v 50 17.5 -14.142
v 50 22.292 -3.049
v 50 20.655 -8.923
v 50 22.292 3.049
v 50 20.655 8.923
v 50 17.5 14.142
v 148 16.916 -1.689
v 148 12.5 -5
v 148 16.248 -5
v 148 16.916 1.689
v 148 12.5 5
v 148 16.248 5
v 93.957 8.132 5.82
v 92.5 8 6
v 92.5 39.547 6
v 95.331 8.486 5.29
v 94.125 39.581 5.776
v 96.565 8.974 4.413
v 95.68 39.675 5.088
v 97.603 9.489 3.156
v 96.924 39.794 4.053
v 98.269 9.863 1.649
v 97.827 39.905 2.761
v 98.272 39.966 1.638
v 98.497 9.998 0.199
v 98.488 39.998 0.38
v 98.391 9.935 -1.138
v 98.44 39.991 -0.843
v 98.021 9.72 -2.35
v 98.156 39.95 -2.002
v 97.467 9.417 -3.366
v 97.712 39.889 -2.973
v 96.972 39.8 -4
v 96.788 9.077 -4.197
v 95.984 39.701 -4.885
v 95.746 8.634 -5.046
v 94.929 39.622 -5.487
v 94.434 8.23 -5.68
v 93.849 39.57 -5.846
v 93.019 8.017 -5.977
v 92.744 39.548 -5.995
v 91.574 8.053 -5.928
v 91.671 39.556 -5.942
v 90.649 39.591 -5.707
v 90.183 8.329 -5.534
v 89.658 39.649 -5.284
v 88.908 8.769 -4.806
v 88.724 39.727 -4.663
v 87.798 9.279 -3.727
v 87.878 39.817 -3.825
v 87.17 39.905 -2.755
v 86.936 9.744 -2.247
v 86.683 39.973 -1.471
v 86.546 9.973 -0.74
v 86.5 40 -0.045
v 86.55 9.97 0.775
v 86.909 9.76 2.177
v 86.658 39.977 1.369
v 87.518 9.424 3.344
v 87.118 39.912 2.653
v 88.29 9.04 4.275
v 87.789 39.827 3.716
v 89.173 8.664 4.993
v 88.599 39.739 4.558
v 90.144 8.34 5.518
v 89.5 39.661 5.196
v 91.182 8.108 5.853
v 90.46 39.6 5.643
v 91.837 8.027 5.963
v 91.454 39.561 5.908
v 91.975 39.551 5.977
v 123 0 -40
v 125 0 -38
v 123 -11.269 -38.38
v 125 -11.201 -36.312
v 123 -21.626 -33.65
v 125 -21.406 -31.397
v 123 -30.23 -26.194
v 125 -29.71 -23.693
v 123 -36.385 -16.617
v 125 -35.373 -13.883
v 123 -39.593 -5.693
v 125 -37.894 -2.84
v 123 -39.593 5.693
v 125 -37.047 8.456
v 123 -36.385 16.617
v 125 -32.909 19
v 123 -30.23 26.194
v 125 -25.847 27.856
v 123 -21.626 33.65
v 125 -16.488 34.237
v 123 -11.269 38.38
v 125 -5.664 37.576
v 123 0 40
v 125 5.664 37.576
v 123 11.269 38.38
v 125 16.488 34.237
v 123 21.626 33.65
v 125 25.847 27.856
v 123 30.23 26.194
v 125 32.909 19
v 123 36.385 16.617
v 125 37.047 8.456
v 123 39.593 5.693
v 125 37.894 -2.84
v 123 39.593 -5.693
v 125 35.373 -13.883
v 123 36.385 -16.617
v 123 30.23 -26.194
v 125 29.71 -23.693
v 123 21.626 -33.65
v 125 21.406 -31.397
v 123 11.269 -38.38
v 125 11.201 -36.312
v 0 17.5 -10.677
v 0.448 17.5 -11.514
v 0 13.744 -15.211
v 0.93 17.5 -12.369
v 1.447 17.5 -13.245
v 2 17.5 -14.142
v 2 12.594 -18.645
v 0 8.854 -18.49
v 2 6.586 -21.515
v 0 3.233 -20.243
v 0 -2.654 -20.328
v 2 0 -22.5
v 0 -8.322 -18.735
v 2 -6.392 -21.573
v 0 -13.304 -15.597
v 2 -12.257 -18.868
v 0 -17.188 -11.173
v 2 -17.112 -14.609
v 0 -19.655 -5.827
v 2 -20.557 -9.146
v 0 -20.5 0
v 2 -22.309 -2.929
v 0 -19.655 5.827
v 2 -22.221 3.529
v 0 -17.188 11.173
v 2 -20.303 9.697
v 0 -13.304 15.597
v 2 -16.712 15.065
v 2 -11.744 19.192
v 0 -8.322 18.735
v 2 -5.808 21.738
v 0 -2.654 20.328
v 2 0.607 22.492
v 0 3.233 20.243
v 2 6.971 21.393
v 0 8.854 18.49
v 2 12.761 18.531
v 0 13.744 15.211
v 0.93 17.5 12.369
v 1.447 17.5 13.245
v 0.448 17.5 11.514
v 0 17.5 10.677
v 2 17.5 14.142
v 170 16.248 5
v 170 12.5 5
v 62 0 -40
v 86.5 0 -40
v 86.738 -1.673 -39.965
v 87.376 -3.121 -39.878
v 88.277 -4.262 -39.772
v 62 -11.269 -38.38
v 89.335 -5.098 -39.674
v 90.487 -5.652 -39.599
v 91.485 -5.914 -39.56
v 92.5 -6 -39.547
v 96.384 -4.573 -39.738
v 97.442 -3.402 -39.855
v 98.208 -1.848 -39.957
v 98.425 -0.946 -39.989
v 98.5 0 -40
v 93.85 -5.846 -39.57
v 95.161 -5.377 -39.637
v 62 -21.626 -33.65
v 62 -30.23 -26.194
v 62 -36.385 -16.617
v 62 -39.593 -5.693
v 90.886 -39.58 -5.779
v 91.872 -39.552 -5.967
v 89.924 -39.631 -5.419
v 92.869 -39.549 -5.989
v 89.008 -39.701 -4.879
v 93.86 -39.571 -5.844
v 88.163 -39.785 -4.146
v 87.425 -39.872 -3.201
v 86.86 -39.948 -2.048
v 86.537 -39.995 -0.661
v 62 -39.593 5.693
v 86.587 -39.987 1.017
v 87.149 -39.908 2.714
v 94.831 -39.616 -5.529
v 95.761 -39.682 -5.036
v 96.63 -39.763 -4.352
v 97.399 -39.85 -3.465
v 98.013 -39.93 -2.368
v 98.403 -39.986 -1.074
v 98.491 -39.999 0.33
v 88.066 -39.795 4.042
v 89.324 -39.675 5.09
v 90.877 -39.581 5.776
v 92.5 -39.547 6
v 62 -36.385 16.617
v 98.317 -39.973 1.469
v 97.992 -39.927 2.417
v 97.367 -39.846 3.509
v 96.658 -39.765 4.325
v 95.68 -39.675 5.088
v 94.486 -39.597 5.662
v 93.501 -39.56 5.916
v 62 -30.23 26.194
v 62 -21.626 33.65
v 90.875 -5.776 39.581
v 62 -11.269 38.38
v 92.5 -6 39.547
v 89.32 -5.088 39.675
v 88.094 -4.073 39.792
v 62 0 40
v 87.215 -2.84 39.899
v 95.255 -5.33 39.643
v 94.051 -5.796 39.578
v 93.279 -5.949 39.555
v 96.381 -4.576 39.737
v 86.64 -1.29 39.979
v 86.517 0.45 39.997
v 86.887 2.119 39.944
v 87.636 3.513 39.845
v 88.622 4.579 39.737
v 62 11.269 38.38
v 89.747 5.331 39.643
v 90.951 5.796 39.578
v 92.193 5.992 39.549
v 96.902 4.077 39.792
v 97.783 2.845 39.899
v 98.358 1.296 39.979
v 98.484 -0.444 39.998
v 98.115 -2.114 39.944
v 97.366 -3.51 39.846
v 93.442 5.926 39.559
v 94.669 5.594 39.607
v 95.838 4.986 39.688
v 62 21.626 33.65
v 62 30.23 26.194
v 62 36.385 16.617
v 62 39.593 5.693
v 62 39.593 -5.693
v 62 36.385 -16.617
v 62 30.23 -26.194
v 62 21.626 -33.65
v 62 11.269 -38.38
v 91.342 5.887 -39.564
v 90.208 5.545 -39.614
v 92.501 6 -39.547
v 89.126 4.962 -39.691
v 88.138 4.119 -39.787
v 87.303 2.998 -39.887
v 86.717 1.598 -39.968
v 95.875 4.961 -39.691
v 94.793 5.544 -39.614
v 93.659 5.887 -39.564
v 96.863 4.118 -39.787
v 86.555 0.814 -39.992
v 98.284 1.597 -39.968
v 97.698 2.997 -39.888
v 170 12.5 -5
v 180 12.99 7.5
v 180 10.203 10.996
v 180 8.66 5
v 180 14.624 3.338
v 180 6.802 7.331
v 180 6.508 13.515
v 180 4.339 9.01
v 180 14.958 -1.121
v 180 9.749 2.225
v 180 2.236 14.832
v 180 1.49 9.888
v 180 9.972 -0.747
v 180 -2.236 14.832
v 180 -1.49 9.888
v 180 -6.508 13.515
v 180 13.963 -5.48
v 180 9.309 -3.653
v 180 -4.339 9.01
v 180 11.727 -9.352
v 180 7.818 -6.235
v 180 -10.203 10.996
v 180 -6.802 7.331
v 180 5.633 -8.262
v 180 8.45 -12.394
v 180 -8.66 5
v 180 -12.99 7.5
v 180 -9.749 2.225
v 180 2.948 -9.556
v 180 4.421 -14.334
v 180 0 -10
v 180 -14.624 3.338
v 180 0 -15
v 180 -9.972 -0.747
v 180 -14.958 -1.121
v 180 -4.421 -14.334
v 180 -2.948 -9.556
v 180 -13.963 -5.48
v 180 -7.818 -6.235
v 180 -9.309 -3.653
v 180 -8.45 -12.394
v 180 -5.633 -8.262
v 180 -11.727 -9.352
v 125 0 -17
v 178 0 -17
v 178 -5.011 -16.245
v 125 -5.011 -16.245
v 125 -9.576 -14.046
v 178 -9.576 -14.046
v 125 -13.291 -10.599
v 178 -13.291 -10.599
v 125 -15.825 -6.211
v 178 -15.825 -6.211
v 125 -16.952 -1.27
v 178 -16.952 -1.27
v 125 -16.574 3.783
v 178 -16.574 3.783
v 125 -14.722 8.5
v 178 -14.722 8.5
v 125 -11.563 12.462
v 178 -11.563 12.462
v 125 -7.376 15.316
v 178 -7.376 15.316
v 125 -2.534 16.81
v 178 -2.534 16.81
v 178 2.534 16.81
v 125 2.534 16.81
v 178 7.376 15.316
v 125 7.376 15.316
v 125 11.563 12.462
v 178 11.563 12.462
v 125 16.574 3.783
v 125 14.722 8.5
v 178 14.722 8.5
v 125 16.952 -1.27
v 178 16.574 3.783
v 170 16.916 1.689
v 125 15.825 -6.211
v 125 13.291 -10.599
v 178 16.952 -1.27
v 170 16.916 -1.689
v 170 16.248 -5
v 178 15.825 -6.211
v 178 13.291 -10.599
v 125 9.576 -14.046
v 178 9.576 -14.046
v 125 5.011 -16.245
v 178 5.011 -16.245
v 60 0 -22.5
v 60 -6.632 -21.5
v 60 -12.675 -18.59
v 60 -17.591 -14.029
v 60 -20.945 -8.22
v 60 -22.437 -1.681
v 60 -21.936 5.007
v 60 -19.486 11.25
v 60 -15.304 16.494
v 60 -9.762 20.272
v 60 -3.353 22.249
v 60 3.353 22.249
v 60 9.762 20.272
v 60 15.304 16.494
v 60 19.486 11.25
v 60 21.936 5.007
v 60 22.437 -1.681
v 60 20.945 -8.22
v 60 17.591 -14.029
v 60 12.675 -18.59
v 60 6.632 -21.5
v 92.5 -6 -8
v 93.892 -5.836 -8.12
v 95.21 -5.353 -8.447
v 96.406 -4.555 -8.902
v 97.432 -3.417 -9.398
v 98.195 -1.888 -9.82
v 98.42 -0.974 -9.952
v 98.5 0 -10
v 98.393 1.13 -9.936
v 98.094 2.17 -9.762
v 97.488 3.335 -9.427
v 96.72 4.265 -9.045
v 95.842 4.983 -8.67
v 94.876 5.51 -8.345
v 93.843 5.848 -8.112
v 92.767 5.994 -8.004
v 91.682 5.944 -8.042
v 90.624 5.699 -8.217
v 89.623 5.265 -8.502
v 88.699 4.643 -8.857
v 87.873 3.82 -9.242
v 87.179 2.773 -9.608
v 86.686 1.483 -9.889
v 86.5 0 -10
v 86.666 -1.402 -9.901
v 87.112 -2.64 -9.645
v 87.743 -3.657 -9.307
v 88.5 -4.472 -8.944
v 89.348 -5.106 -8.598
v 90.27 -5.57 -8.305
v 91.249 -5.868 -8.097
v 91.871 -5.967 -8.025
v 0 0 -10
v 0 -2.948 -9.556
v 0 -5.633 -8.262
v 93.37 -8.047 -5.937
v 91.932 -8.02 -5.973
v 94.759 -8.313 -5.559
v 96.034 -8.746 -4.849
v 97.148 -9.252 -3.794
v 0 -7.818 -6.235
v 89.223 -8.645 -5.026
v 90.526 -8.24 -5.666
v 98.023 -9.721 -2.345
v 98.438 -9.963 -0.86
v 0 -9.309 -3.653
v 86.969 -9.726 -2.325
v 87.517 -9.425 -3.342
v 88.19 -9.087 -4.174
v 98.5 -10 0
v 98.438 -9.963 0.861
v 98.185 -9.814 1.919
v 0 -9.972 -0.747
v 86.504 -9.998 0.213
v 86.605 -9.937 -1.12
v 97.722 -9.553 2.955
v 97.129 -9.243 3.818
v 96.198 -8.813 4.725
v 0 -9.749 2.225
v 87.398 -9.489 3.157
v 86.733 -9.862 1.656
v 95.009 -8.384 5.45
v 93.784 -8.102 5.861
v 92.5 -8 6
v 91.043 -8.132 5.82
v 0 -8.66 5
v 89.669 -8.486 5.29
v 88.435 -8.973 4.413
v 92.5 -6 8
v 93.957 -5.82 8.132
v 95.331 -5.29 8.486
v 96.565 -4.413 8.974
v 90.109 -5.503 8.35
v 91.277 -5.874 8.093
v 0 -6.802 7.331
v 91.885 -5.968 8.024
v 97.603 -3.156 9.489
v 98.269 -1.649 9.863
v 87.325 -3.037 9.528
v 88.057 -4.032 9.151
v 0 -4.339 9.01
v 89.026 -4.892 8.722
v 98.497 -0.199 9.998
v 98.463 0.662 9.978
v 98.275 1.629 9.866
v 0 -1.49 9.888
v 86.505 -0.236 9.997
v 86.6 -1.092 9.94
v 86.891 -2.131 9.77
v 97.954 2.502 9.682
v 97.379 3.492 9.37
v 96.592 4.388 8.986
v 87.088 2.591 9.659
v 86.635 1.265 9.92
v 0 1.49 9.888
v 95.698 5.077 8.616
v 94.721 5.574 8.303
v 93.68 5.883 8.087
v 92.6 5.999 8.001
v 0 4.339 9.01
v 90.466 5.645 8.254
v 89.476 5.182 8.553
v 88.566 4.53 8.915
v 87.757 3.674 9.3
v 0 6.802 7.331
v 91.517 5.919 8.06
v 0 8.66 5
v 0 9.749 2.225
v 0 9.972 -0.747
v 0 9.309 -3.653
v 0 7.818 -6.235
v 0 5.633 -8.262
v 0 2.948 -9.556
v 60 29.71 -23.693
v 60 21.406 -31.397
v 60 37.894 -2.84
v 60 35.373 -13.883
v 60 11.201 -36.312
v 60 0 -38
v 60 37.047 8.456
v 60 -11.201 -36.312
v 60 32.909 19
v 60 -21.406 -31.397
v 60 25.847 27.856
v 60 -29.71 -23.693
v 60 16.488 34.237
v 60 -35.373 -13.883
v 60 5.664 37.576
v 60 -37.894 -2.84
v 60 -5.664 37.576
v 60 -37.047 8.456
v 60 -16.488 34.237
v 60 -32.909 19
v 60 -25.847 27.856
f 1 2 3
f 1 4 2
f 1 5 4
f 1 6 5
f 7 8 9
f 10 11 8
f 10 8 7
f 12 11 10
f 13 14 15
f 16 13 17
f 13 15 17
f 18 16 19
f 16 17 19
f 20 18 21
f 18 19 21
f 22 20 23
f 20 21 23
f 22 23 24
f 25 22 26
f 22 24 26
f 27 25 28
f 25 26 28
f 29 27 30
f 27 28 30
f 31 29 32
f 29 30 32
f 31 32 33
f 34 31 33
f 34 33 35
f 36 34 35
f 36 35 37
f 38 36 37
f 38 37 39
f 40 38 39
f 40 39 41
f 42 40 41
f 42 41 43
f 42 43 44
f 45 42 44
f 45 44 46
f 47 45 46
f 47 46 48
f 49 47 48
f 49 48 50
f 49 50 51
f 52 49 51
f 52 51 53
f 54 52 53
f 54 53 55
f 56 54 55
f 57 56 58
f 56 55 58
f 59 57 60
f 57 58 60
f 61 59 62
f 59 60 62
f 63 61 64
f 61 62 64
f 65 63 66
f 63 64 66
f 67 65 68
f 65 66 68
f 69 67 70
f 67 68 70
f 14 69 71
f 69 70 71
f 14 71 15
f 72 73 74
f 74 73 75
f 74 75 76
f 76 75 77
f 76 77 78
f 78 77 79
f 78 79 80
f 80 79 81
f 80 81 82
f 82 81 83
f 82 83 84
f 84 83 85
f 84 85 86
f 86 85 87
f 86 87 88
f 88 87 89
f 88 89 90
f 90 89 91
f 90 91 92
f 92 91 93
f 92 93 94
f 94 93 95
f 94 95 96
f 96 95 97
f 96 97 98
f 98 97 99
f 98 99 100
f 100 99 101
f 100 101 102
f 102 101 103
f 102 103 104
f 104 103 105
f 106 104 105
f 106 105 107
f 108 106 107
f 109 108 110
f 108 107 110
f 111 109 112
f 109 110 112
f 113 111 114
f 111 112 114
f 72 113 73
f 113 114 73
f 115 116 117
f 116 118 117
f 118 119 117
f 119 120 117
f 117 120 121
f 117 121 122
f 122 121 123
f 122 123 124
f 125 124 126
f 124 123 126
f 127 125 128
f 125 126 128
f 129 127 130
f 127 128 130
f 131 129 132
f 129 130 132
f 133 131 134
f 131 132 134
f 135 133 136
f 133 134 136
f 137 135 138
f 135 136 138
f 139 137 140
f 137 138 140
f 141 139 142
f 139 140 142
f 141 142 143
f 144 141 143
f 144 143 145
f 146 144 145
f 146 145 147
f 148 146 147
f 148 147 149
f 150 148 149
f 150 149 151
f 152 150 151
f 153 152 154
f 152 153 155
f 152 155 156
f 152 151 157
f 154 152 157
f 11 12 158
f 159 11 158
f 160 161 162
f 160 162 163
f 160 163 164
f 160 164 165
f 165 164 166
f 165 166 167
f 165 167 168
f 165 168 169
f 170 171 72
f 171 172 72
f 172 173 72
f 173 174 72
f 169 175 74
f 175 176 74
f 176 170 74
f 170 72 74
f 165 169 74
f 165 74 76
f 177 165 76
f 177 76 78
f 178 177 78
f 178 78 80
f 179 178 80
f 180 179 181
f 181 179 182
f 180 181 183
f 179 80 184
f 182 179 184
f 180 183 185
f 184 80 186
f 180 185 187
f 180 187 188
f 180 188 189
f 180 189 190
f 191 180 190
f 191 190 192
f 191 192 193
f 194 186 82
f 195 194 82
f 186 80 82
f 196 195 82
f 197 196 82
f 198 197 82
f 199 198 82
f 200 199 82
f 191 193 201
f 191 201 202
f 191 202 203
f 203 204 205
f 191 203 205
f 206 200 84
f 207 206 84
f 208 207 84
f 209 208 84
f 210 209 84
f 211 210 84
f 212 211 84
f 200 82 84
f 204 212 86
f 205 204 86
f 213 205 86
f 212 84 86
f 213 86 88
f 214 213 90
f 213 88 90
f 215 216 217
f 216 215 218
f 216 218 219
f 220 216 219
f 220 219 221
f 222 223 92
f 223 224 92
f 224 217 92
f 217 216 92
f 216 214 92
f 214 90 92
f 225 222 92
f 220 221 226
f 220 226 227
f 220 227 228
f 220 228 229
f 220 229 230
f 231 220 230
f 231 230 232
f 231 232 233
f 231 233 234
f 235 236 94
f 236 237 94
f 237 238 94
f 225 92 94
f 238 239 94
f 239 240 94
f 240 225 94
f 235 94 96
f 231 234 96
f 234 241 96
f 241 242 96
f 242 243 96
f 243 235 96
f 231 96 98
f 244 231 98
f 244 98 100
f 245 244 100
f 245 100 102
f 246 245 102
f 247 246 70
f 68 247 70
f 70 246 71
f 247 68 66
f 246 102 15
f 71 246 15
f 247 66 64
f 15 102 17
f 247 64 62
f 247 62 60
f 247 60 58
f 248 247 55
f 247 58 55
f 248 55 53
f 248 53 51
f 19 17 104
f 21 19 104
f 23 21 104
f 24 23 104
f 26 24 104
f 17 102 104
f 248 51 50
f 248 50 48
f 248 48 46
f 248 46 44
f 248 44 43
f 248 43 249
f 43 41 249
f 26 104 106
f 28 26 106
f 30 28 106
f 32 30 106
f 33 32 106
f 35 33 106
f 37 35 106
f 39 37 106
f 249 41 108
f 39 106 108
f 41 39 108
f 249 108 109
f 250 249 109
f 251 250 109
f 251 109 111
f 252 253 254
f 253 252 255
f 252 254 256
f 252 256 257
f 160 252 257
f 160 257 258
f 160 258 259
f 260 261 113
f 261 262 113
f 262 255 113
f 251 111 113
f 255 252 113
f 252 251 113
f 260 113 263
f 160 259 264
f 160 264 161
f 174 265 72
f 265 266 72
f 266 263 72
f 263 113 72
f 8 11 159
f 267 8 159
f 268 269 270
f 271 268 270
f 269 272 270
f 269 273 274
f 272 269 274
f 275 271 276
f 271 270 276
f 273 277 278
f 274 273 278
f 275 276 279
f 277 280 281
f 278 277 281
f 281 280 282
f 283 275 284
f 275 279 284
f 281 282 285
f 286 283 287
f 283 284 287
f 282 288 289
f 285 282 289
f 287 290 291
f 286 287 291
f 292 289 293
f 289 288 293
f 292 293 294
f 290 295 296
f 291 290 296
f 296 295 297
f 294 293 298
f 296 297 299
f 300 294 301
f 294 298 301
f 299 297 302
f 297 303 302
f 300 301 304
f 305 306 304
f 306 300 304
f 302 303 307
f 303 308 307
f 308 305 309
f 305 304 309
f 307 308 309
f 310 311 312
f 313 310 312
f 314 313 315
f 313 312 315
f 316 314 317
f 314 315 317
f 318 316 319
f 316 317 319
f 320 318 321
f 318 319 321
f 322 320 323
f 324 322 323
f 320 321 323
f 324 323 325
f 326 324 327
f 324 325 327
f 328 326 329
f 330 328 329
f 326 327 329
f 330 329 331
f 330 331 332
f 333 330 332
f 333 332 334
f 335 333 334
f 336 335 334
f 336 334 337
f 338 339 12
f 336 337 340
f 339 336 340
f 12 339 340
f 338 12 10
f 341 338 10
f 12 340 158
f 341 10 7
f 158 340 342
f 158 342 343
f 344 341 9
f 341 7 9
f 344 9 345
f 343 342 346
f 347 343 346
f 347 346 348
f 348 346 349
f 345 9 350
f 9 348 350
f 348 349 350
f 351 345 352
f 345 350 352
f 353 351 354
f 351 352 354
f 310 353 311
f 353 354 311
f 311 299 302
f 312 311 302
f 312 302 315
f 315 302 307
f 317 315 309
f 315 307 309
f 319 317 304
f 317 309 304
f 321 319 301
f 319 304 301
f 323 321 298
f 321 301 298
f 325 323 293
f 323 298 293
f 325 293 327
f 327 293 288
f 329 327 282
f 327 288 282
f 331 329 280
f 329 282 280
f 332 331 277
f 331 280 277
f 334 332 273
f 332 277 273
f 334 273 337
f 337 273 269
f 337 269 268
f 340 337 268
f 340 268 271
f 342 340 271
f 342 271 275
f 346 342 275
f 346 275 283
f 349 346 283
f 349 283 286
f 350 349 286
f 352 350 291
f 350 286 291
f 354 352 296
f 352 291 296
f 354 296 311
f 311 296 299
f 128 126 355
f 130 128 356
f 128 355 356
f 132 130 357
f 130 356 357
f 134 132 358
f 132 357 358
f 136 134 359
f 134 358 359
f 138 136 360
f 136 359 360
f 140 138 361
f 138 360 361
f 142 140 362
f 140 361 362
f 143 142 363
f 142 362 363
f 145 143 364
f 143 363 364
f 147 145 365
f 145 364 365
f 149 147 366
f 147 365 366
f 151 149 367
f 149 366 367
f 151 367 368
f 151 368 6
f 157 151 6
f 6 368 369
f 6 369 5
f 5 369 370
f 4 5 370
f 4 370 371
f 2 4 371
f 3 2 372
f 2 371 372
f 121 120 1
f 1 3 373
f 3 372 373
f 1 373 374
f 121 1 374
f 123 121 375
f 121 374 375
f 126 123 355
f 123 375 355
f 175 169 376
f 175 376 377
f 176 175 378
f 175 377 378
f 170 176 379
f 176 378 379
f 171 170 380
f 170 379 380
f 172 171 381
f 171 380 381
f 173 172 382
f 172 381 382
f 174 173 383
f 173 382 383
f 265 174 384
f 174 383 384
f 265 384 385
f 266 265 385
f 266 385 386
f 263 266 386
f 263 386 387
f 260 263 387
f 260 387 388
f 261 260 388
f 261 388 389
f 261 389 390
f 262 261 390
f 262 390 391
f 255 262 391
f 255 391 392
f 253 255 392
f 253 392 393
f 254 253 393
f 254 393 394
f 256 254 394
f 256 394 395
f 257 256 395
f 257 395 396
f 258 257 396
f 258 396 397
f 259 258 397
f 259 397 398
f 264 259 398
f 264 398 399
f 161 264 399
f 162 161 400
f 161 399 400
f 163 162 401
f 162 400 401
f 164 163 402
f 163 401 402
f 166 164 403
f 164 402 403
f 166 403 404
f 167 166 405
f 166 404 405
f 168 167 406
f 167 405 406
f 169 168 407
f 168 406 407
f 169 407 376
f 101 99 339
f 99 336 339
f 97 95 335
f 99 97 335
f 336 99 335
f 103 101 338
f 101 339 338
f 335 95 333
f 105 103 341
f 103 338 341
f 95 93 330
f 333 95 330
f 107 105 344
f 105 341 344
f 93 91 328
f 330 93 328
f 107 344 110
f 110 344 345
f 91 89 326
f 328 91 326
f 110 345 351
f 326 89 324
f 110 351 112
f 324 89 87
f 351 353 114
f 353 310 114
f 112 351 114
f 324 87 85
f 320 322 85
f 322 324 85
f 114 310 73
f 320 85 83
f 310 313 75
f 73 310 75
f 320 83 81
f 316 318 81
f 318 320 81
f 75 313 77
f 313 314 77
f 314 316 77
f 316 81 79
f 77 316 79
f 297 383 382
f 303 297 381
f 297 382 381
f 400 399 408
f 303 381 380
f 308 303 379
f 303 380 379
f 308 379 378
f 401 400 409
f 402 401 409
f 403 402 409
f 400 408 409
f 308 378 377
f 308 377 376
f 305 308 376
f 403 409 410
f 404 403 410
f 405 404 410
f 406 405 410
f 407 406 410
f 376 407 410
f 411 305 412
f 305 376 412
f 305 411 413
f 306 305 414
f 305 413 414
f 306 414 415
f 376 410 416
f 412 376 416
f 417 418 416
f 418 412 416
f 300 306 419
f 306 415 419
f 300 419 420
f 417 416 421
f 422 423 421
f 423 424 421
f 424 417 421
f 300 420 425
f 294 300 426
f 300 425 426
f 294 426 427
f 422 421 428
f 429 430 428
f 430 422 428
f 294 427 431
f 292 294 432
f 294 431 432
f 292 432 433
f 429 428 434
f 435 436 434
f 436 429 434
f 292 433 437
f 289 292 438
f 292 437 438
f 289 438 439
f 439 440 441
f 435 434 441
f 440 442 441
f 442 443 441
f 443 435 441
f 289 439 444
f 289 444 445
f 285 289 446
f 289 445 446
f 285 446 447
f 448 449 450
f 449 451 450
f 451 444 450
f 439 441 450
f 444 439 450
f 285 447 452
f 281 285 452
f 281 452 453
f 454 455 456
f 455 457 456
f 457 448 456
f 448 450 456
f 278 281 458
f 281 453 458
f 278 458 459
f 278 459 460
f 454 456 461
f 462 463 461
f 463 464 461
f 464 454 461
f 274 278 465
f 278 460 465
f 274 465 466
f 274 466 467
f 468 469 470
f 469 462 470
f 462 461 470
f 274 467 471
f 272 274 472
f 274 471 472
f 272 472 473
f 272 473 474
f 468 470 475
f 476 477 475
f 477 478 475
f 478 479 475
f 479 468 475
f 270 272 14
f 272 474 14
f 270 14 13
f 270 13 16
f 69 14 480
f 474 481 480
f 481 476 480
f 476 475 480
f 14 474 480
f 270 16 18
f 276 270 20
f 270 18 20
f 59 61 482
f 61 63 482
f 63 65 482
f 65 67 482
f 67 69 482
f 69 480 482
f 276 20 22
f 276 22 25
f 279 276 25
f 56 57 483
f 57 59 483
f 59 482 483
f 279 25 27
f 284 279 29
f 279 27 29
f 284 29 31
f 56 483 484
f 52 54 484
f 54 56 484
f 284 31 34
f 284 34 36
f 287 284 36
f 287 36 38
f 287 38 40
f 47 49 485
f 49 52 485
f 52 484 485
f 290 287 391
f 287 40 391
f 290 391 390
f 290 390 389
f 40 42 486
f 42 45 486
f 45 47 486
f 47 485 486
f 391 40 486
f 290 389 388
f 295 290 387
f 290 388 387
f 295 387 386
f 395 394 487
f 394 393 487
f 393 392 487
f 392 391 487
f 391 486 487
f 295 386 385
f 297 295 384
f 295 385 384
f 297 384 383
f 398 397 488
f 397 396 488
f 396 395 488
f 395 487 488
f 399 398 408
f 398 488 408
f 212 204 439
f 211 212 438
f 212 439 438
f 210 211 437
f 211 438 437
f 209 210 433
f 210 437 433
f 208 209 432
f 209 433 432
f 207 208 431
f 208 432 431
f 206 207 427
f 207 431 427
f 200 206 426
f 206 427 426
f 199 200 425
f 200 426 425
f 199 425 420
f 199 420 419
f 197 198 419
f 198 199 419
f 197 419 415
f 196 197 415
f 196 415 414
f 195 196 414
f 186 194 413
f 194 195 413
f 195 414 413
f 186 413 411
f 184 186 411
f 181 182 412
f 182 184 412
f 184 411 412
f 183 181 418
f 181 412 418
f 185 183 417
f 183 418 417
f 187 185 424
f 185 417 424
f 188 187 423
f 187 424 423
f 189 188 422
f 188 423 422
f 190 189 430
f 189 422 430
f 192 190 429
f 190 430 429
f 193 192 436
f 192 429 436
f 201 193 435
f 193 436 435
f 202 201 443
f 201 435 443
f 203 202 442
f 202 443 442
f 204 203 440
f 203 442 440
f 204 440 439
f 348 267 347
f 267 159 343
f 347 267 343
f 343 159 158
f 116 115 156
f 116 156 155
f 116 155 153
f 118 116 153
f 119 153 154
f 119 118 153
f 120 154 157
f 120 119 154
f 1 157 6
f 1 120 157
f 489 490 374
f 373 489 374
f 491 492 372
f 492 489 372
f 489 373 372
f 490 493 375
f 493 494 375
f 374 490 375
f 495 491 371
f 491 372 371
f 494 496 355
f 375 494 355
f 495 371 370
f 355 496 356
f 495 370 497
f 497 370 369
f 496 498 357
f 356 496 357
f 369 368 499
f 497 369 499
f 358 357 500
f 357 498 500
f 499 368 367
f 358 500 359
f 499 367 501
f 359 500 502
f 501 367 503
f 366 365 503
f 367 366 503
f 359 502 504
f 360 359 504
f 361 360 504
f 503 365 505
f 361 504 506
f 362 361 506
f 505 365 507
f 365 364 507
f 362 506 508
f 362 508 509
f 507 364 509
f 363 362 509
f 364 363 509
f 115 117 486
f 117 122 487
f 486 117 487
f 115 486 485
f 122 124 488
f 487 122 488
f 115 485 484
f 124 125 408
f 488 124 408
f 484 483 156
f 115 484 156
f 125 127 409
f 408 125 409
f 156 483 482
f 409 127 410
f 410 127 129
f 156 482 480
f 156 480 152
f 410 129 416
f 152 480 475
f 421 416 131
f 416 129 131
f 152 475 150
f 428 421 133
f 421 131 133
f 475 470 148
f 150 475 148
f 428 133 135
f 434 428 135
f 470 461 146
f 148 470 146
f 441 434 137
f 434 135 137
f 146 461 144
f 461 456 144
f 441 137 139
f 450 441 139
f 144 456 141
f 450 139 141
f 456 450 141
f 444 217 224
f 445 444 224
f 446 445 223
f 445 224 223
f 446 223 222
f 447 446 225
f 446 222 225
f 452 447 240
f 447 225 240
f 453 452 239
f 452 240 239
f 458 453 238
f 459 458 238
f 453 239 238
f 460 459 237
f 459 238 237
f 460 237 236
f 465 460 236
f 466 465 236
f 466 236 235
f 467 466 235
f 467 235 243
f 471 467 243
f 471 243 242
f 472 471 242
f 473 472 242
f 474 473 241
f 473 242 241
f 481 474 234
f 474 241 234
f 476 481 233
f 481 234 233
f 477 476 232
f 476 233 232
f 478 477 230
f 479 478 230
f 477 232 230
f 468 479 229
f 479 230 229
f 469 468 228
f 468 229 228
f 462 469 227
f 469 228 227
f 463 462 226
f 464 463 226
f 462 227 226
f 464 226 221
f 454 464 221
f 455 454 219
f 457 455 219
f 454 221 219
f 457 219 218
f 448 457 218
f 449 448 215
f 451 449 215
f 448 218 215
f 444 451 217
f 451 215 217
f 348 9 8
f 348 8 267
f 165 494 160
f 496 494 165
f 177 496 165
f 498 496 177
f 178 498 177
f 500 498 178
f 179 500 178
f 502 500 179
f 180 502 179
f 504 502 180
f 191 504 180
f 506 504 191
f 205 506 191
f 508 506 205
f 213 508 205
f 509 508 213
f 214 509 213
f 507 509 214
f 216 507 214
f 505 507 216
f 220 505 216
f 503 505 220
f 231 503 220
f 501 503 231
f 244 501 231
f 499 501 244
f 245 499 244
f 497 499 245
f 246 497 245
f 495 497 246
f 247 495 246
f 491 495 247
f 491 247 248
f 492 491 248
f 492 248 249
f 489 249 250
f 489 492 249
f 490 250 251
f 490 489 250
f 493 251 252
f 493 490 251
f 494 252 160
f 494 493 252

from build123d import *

# Parameters (mm, degrees)
SKETCH_6_W                = 22
SKETCH_6_H                = 4.5
CUT_EXTRUDE_4_DEPTH       = 5
CUT_EXTRUDE_11_DEPTH      = 189.679622641
CUT_EXTRUDE_11_DEPTH_BACK = 189.679622641
SKETCH_6_3_W              = 50
SKETCH_6_3_H              = 5
SKETCH_16_R               = 6
CUT_EXTRUDE_10_DEPTH      = 189.679622641
PATTERN_CIRCULAR_1_COUNT  = 4
CHAMFER_3_SIZE            = 2


with BuildPart() as part:
    # Эскиз1 → Повернуть1 (revolve)
    with BuildSketch(Plane.XY):
        Polygon((0, 10), (0, 22.5), (60, 22.5), (60, 40), (125, 40), (125, 17), (180, 17), (180, 10), align=None)
    revolve(axis=Axis((0, 0, 0), (-1, 0, 0)))

    # Эскиз6 → Вырез-Вытянуть4 (cut, symmetric)
    with BuildSketch(Plane.XY):
        with Locations((159, 14.75)):
            Rectangle(SKETCH_6_W, SKETCH_6_H)
    extrude(amount=CUT_EXTRUDE_4_DEPTH, both=True, mode=Mode.SUBTRACT)

    # Эскиз6<3> → Вырез-Вытянуть11 (cut, two sides: drawn at the far end of the back side and taken through both)
    with BuildSketch(Plane.XY.offset(-CUT_EXTRUDE_11_DEPTH_BACK)):
        with Locations((25, 20)):
            Rectangle(SKETCH_6_3_W, SKETCH_6_3_H)
    extrude(amount=CUT_EXTRUDE_11_DEPTH + CUT_EXTRUDE_11_DEPTH_BACK, mode=Mode.SUBTRACT)

    # Эскиз16 → Вырез-Вытянуть10 (cut, symmetric)
    with BuildSketch(Plane(origin=(0, 0, 0), x_dir=(1, 0, 0), z_dir=(0, 1, 0))):
        with Locations((92.5, 0)):
            Circle(SKETCH_16_R)
    cut_extrude_10 = extrude(amount=CUT_EXTRUDE_10_DEPTH, both=True, mode=Mode.SUBTRACT)

    # Круговой массив1: Вырез-Вытянуть10 ×4 about axis
    pattern_circular_1_axis = Axis((0, 0, 0), (1, 0, 0))
    for i in range(1, PATTERN_CIRCULAR_1_COUNT):
        add(cut_extrude_10.rotate(pattern_circular_1_axis, i * 360 / PATTERN_CIRCULAR_1_COUNT), mode=Mode.SUBTRACT)

    # Фаска3
    chamfer_3_edges = [part.edges().sort_by_distance(p)[0] for p in [
        (180, -17, 0),
        (0, -22.5, 0),
        (125, -40, 0),
        (60, -40, 0),
    ]]
    chamfer(chamfer_3_edges, length=CHAMFER_3_SIZE)


solid = part.part
